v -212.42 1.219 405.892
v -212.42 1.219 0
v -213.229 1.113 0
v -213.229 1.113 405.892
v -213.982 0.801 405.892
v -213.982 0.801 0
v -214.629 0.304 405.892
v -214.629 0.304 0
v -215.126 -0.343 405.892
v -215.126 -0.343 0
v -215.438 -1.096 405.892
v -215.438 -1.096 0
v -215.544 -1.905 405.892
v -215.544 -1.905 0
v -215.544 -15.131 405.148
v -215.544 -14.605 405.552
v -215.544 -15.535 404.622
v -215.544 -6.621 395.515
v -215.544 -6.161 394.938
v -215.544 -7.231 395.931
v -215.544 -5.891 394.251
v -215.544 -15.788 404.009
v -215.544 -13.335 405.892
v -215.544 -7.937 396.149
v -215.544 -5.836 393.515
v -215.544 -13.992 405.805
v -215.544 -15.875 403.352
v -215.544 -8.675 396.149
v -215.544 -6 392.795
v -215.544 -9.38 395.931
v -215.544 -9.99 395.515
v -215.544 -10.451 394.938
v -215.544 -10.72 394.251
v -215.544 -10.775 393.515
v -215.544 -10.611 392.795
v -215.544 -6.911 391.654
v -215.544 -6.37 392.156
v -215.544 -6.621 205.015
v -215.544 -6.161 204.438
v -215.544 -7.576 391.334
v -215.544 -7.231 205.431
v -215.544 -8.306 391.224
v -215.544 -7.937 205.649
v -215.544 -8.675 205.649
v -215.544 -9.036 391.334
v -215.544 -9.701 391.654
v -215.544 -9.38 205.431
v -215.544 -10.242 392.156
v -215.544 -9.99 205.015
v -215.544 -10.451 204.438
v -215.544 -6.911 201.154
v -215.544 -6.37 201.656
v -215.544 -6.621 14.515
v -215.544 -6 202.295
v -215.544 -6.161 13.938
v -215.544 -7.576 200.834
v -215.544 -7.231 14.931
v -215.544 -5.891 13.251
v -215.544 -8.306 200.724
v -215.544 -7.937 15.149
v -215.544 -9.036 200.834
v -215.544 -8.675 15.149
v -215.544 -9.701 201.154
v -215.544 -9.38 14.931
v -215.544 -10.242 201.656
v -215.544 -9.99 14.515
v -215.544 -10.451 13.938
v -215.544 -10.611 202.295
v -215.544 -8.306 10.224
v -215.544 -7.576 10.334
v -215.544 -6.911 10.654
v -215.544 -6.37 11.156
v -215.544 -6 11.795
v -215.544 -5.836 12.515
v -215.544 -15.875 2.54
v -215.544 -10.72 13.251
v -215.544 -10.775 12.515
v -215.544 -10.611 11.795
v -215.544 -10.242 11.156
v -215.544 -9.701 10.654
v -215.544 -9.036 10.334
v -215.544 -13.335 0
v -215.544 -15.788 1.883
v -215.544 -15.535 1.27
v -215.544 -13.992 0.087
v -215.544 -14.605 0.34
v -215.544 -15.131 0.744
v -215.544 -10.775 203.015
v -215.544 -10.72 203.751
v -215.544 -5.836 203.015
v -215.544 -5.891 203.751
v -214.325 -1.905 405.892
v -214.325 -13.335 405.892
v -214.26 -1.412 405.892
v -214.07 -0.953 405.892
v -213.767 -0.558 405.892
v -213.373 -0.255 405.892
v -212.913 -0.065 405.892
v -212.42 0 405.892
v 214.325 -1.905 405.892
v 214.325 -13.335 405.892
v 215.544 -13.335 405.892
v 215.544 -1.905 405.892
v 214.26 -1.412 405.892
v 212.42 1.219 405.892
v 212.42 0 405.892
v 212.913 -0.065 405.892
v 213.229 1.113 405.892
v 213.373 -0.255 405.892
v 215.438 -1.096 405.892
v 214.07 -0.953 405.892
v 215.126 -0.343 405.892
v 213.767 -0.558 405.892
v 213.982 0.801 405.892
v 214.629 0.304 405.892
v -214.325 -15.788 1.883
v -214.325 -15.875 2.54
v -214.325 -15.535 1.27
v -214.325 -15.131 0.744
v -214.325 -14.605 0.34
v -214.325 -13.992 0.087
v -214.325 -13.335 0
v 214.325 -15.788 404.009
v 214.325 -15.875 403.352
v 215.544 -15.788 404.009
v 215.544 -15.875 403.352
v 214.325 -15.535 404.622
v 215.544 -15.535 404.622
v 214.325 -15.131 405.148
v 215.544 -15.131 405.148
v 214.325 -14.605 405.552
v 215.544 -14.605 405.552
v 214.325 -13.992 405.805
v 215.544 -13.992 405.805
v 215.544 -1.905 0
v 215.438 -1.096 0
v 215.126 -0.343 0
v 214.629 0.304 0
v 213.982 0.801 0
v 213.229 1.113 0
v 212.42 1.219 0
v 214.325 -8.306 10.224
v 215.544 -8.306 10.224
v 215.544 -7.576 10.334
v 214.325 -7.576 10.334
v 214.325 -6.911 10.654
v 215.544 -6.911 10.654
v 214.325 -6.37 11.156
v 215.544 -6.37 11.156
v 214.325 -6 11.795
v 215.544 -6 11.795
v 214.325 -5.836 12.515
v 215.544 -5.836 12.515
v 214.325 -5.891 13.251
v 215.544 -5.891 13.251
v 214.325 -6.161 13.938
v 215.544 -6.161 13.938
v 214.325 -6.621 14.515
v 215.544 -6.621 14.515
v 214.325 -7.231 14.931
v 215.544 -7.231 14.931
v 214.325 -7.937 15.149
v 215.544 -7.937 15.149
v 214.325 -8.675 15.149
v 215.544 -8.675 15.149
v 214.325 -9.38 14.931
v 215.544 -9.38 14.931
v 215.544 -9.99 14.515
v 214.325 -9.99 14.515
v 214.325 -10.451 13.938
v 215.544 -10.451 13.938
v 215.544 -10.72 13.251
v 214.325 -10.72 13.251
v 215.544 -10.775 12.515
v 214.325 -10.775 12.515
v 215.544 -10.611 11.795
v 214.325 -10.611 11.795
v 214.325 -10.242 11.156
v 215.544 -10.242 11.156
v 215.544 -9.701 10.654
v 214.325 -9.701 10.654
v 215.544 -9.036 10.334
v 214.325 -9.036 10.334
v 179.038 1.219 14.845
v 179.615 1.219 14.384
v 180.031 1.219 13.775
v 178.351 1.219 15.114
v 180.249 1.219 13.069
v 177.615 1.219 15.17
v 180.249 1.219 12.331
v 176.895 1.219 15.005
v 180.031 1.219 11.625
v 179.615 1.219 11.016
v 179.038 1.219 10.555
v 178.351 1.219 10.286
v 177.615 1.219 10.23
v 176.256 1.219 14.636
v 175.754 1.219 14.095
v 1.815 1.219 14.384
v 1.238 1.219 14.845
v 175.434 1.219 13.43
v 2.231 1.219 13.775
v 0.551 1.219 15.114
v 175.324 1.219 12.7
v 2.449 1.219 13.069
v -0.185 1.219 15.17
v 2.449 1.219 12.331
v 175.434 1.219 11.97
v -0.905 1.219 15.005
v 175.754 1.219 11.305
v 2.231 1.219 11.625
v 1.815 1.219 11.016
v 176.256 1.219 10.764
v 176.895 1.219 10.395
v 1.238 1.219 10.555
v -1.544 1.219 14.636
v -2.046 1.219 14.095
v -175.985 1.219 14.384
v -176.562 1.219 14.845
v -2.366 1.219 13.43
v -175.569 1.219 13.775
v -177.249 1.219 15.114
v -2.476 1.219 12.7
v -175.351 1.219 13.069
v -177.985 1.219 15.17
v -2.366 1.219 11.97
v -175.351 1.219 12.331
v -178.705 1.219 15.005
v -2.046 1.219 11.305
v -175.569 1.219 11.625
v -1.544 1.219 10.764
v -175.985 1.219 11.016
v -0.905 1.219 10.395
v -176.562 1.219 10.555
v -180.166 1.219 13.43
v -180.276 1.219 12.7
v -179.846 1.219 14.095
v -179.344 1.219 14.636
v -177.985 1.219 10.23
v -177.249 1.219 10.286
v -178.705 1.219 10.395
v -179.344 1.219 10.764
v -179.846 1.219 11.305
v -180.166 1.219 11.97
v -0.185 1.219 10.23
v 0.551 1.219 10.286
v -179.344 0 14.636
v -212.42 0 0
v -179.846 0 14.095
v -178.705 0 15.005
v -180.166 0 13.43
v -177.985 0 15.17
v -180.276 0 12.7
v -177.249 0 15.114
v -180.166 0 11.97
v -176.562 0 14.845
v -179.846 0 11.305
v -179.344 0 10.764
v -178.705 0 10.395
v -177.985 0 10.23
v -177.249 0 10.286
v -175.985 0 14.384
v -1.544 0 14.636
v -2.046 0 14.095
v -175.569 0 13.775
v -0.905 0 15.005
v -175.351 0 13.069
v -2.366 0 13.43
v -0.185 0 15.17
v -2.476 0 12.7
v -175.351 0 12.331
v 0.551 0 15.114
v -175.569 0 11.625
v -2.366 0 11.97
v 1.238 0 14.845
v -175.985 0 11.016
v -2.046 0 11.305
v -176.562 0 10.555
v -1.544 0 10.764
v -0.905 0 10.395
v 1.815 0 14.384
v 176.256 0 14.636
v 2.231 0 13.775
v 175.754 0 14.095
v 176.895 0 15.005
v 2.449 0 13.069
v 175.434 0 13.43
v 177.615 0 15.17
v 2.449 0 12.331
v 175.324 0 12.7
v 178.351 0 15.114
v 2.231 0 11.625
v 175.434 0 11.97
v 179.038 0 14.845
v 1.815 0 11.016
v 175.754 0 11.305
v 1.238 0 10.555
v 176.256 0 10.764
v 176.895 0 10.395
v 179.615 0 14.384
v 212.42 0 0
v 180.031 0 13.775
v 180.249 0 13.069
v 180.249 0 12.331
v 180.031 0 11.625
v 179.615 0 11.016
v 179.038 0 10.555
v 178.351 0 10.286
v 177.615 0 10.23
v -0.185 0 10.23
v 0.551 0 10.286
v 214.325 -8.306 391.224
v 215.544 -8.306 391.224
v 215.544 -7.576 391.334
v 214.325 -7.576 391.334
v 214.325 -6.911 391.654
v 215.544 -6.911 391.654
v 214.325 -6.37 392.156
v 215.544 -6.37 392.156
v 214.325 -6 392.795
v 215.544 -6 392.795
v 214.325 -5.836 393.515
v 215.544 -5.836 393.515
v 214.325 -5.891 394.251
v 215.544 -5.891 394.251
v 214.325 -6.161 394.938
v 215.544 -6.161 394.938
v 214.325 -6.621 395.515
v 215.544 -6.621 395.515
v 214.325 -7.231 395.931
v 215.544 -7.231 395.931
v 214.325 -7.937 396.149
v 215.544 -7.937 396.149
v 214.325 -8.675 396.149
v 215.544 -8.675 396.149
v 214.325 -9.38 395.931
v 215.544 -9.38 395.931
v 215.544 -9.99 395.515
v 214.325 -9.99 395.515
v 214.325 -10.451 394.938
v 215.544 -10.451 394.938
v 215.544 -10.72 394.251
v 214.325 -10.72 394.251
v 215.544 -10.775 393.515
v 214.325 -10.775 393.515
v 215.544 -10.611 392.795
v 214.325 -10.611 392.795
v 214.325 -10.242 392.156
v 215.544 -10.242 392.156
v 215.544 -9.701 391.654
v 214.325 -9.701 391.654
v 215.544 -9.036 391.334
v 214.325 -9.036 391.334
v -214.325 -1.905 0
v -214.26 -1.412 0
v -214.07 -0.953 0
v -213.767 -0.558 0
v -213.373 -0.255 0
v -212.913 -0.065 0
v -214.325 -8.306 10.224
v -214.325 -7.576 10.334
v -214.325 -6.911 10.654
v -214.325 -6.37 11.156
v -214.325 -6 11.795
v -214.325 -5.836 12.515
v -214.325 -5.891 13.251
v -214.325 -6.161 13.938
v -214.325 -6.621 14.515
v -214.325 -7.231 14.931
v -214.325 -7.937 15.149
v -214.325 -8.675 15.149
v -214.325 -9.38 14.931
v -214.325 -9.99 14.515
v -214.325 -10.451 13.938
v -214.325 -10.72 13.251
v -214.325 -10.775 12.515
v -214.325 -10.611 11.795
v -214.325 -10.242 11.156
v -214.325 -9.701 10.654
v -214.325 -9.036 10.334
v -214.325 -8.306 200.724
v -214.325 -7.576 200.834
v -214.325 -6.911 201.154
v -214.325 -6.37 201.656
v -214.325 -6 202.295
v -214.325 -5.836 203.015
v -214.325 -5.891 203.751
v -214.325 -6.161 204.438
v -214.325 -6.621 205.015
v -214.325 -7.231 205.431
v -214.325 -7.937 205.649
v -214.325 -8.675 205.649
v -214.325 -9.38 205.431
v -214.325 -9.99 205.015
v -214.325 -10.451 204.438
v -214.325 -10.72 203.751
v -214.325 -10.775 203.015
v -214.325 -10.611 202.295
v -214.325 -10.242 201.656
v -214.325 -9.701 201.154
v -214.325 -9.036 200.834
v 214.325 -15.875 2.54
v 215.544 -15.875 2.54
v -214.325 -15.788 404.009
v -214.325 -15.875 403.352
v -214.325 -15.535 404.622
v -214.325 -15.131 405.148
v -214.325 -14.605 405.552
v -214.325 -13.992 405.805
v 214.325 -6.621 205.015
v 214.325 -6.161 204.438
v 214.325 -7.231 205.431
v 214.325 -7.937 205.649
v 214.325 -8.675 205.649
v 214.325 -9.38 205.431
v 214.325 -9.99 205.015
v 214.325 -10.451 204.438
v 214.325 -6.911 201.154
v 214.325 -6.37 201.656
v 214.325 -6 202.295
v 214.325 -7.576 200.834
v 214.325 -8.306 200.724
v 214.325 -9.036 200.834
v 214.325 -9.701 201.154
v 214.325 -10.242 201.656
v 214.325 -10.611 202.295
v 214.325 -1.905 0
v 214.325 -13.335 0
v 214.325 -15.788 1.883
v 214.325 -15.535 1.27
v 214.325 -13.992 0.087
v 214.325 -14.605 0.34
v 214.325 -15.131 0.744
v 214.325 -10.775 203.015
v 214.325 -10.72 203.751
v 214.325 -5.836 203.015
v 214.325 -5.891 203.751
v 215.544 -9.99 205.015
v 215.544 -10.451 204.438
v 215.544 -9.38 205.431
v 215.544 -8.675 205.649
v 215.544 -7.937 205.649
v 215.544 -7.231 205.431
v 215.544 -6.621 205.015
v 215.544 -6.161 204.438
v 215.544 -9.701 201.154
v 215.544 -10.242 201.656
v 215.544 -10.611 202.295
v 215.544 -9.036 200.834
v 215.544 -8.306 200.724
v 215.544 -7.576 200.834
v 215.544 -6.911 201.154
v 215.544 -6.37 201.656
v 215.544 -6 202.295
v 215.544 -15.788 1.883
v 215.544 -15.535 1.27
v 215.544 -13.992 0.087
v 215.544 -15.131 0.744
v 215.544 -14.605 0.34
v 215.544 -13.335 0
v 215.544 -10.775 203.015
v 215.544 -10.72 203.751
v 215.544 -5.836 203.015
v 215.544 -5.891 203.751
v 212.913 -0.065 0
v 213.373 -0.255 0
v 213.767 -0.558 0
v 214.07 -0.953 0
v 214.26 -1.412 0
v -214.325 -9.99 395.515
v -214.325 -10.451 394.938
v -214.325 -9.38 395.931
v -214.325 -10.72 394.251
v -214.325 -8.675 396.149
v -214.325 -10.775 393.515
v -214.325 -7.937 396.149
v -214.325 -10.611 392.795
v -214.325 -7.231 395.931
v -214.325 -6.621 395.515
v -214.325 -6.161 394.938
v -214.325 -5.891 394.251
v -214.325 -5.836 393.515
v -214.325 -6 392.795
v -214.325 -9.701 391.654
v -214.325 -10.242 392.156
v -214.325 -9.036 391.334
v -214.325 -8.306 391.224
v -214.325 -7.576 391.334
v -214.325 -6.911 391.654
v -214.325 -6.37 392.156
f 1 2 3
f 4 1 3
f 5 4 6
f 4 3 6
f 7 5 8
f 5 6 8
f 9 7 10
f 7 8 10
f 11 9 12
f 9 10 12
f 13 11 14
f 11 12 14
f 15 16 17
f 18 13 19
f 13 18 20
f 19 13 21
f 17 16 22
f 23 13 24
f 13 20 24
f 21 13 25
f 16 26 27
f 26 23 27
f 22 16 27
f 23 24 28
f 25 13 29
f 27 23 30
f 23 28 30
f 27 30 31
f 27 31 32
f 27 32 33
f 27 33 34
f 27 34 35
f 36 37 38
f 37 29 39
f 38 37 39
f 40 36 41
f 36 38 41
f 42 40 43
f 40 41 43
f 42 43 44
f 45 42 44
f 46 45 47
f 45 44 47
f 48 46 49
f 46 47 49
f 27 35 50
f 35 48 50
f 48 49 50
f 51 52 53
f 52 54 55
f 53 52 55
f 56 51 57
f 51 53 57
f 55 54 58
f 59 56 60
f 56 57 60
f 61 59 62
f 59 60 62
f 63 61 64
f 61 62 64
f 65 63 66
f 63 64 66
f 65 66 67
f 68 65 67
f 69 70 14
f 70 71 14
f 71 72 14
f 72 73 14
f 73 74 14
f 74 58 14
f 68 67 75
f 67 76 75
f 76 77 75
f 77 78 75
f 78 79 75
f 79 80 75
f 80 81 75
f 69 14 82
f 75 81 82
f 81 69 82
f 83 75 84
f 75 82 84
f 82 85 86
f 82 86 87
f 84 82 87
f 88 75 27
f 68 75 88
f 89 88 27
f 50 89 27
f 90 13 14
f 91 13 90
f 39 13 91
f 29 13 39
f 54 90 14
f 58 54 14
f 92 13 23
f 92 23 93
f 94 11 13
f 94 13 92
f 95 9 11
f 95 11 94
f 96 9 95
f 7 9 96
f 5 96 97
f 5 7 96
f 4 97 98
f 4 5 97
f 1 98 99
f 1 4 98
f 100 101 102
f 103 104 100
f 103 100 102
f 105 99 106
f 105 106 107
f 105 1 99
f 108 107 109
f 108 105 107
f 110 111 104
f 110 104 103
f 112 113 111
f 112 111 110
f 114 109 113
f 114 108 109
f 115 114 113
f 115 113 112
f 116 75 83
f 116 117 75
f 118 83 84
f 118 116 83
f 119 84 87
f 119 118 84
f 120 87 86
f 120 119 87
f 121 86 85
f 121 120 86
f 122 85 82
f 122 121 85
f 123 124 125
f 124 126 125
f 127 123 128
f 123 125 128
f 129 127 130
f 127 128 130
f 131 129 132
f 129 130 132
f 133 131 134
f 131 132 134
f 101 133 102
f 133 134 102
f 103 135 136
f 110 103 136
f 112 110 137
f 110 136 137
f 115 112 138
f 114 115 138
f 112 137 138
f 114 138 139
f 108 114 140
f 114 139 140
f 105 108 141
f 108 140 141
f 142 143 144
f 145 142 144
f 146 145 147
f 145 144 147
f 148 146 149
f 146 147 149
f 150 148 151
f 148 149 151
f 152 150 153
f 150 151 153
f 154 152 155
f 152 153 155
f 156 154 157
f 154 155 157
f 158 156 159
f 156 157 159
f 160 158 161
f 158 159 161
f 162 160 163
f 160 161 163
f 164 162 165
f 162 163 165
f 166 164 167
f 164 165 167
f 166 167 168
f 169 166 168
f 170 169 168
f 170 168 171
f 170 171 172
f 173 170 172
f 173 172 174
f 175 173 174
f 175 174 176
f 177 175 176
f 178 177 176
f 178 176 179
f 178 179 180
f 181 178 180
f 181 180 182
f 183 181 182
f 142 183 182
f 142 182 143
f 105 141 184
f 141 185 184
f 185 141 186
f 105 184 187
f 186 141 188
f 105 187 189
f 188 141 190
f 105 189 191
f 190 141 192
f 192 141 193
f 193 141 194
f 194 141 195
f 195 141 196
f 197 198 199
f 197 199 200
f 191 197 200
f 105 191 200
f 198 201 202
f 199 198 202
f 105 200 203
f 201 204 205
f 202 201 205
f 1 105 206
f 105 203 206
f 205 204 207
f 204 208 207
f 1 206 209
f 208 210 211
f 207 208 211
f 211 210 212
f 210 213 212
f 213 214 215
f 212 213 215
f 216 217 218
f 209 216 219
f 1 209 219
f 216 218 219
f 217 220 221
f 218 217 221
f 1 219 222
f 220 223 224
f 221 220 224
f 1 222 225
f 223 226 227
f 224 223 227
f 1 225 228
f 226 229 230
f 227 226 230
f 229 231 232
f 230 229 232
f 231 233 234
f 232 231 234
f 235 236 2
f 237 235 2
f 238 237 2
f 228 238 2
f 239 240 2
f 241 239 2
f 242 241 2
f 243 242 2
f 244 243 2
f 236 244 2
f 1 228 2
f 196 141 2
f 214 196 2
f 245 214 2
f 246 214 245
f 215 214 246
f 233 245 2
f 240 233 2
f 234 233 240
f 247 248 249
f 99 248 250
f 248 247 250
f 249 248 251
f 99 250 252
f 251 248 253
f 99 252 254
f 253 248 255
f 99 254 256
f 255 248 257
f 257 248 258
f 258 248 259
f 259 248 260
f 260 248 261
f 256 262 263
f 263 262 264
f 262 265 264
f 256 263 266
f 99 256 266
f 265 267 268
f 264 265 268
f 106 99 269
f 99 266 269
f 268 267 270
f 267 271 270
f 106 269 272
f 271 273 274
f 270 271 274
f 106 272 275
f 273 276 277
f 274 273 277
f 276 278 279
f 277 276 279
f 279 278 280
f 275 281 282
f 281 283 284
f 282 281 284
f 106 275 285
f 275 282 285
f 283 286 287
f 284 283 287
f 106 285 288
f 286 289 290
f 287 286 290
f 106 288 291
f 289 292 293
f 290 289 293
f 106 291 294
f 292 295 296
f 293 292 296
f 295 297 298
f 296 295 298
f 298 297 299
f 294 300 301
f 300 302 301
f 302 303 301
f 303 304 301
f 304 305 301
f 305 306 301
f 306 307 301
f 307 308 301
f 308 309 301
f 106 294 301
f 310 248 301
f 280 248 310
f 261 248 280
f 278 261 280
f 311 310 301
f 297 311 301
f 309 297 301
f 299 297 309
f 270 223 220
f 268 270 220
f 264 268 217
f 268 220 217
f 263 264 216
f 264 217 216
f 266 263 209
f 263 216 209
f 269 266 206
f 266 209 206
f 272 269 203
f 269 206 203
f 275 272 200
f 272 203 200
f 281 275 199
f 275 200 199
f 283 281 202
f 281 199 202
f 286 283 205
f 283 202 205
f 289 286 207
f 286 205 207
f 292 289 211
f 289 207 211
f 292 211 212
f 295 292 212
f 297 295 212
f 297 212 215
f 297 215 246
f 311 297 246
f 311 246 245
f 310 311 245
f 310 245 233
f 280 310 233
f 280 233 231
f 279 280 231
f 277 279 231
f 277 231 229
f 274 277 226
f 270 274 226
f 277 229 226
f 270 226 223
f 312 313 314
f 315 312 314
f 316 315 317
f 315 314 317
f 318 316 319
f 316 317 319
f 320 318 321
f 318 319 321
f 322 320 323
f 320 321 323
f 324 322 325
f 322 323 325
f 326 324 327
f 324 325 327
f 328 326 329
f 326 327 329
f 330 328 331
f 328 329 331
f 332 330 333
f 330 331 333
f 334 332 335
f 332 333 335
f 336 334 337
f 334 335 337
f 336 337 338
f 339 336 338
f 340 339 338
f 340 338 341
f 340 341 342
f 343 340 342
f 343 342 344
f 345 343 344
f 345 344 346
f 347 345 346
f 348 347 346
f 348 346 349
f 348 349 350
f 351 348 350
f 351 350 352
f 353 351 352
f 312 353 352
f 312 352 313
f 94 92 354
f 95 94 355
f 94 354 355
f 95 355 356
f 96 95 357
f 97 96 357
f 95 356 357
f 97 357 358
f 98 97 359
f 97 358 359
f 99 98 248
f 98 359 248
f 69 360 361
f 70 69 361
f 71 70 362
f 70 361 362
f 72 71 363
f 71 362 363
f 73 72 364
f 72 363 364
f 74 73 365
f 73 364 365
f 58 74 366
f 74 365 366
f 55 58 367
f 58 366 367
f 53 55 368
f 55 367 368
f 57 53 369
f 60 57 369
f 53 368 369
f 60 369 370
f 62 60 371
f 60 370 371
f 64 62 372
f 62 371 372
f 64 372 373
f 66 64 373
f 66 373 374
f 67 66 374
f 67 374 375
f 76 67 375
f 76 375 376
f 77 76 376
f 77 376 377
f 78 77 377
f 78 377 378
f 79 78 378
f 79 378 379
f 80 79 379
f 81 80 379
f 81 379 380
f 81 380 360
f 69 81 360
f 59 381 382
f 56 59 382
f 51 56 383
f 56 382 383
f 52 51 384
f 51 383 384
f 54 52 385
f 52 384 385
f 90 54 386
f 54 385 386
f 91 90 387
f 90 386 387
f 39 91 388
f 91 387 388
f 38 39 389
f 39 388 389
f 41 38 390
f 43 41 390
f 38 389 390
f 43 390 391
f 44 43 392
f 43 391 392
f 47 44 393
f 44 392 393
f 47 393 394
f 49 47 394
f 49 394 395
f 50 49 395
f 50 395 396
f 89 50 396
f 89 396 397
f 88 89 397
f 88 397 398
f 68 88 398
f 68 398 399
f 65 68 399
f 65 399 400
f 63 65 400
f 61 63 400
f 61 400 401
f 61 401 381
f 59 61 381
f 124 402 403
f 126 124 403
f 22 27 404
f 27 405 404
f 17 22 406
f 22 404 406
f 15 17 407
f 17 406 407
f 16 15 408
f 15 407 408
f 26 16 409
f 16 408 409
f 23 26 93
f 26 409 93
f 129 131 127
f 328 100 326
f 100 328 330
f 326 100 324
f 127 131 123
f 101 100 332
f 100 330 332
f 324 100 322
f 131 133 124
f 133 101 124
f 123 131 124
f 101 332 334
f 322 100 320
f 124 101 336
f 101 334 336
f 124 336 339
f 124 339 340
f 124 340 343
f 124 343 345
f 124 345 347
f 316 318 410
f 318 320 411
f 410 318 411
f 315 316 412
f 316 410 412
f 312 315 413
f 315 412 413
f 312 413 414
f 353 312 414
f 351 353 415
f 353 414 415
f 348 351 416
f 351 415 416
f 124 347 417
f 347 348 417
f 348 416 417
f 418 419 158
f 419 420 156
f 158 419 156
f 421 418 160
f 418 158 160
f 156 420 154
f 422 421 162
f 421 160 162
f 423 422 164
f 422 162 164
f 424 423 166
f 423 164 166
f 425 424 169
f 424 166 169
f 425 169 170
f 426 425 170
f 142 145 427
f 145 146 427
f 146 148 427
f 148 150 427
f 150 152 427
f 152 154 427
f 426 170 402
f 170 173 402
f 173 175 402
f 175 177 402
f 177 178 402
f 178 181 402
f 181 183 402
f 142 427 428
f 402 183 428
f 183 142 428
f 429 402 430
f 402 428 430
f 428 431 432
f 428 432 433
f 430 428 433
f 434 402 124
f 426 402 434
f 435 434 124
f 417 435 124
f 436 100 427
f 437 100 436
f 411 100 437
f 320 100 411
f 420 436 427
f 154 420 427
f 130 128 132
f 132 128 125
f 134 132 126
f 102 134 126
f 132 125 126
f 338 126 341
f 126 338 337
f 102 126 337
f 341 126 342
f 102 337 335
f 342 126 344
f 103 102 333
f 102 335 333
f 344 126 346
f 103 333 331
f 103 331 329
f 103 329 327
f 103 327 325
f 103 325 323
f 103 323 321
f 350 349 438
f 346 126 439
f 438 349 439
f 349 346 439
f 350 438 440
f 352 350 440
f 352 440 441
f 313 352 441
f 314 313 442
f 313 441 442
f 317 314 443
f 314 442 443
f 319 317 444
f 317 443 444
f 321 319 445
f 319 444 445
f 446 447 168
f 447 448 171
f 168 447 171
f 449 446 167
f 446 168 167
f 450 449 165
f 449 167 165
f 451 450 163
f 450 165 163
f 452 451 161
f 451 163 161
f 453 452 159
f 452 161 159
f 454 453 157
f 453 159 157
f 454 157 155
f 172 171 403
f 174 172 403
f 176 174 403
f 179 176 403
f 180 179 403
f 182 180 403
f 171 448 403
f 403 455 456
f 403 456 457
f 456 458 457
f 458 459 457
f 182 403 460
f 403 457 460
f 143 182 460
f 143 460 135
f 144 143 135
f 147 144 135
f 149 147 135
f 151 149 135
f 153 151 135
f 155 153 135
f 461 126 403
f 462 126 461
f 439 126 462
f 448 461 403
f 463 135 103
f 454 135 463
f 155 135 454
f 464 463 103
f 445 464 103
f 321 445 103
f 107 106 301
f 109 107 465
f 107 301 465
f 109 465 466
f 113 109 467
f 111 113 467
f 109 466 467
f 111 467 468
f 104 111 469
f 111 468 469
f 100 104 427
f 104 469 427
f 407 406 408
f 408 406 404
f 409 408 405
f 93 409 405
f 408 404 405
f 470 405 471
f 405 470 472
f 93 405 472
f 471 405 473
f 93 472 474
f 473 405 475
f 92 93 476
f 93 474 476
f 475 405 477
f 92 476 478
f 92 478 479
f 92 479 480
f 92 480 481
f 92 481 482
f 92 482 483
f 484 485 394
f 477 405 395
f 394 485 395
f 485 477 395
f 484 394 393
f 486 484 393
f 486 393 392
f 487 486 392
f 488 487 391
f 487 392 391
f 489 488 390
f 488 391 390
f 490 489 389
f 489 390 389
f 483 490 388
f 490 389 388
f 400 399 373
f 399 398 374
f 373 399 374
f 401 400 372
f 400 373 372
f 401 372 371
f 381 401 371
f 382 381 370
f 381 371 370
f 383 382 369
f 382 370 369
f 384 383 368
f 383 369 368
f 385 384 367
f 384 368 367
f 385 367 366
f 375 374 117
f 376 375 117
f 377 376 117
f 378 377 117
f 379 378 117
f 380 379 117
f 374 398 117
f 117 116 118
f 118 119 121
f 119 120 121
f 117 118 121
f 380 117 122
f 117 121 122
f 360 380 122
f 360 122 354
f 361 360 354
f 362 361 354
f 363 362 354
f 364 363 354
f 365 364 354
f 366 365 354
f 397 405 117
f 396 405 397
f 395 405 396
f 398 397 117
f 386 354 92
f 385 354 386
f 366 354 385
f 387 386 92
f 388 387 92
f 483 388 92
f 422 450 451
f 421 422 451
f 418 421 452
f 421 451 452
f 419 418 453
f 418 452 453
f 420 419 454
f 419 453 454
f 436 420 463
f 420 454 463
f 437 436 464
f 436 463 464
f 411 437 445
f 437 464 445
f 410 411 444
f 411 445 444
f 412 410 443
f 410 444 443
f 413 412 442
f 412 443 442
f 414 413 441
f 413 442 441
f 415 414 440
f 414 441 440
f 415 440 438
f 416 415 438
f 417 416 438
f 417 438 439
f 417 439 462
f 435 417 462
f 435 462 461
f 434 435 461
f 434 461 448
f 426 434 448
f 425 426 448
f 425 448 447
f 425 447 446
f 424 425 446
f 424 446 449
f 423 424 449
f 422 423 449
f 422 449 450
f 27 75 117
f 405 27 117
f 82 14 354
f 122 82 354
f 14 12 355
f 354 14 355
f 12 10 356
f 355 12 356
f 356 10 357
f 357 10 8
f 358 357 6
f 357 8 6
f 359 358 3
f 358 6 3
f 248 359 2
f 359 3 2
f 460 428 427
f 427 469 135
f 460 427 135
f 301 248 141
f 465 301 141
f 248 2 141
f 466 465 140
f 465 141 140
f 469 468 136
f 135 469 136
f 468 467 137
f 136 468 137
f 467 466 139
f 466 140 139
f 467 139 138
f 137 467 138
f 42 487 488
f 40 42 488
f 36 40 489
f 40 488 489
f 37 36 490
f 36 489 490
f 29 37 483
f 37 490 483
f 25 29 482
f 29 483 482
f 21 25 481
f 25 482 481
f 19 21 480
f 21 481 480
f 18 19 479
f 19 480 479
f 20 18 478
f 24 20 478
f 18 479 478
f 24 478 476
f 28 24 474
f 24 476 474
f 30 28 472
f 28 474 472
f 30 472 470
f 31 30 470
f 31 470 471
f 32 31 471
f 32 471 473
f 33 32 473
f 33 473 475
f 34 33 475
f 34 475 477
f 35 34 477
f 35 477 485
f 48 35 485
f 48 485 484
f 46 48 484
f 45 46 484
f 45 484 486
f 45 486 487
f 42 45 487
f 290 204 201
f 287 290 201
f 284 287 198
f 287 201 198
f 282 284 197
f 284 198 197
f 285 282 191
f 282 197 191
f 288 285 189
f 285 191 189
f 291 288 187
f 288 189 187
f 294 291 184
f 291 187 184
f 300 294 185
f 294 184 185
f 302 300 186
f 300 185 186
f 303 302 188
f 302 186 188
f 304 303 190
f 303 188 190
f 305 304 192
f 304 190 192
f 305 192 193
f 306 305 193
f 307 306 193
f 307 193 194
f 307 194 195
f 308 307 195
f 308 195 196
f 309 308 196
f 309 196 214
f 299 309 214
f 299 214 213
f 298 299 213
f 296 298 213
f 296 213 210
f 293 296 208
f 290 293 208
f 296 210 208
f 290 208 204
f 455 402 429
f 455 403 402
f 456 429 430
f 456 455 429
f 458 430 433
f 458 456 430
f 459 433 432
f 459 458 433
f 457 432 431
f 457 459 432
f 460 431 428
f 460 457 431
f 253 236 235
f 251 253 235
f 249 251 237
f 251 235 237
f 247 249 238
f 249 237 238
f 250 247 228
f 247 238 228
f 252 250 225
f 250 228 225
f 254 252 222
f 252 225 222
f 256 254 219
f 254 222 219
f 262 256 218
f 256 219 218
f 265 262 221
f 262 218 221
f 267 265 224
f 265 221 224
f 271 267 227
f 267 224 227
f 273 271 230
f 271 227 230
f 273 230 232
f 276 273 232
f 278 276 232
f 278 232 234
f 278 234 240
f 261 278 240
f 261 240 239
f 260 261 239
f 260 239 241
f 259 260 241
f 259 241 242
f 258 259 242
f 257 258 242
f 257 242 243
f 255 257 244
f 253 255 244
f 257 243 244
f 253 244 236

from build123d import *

# Parameters (mm, degrees)
BASE_FLANGE1_DEPTH = 405.892
FILLET1_R          = 2.54
SKETCH3_R          = 2.4765
CUT_EXTRUDE1_DEPTH = 593.315696883
SKETCH4_R          = 2.4765
CUT_EXTRUDE2_DEPTH = 1.2192


# Sheet-metal steps are written as plain solids
with BuildPart() as part:
    # Sketch1 → Base-Flange1 (new body)
    with BuildSketch(Plane.XY):
        with BuildLine():
            Line((-214.3252, -15.875), (-214.3252, -1.905))
            ThreePointArc((-214.3252, -1.905), (-213.767238418, -0.557961582), (-212.4202, 0))
            Line((-212.4202, 0), (212.4202, 0))
            ThreePointArc((212.4202, 0), (213.767238418, -0.557961582), (214.3252, -1.905))
            Line((214.3252, -1.905), (214.3252, -15.875))
            Line((214.3252, -15.875), (215.5444, -15.875))
            Line((215.5444, -15.875), (215.5444, -1.905))
            ThreePointArc((215.5444, -1.905), (214.629343006, 0.304143006), (212.4202, 1.2192))
            Line((212.4202, 1.2192), (-212.4202, 1.2192))
            ThreePointArc((-212.4202, 1.2192), (-214.629343006, 0.304143006), (-215.5444, -1.905))
            Line((-215.5444, -1.905), (-215.5444, -15.875))
            Line((-215.5444, -15.875), (-214.3252, -15.875))
        make_face()
    extrude(amount=BASE_FLANGE1_DEPTH)

    # Fillet1
    fillet1_edges = [part.edges().sort_by_distance(p)[0] for p in [
        (214.9348, -15.875, 0),
        (214.9348, -15.875, 405.892),
        (-214.9348, -15.875, 405.892),
        (-214.9348, -15.875, 0),
    ]]
    fillet(fillet1_edges, radius=FILLET1_R)

    # Sketch3 → Cut-Extrude1 (cut, through all)
    with BuildSketch(Plane(origin=(215.5444, 0, 0), x_dir=(0, 0, -1), z_dir=(1, 0, 0))):
        with Locations((-393.7, -8.305800148)):
            Circle(SKETCH3_R)
        with Locations((-203.2, -8.305800148)):
            Circle(SKETCH3_R)
        with Locations((-12.7, -8.305800148)):
            Circle(SKETCH3_R)
    extrude(amount=-CUT_EXTRUDE1_DEPTH, mode=Mode.SUBTRACT)

    # Sketch4 → Cut-Extrude2 (cut)
    with BuildSketch(Plane(origin=(0, 1.2192, 0), x_dir=(1, 0, 0), z_dir=(0, 1, 0))):
        with Locations(Location((-177.8, -12.7, 0), (0, 0, 180))):
            Circle(SKETCH4_R)
        with Locations(Location((0, -12.7, 0), (0, 0, 180))):
            Circle(SKETCH4_R)
        with Locations(Location((177.8, -12.7, 0), (0, 0, 180))):
            Circle(SKETCH4_R)
    extrude(amount=-CUT_EXTRUDE2_DEPTH, mode=Mode.SUBTRACT)


solid = part.part
